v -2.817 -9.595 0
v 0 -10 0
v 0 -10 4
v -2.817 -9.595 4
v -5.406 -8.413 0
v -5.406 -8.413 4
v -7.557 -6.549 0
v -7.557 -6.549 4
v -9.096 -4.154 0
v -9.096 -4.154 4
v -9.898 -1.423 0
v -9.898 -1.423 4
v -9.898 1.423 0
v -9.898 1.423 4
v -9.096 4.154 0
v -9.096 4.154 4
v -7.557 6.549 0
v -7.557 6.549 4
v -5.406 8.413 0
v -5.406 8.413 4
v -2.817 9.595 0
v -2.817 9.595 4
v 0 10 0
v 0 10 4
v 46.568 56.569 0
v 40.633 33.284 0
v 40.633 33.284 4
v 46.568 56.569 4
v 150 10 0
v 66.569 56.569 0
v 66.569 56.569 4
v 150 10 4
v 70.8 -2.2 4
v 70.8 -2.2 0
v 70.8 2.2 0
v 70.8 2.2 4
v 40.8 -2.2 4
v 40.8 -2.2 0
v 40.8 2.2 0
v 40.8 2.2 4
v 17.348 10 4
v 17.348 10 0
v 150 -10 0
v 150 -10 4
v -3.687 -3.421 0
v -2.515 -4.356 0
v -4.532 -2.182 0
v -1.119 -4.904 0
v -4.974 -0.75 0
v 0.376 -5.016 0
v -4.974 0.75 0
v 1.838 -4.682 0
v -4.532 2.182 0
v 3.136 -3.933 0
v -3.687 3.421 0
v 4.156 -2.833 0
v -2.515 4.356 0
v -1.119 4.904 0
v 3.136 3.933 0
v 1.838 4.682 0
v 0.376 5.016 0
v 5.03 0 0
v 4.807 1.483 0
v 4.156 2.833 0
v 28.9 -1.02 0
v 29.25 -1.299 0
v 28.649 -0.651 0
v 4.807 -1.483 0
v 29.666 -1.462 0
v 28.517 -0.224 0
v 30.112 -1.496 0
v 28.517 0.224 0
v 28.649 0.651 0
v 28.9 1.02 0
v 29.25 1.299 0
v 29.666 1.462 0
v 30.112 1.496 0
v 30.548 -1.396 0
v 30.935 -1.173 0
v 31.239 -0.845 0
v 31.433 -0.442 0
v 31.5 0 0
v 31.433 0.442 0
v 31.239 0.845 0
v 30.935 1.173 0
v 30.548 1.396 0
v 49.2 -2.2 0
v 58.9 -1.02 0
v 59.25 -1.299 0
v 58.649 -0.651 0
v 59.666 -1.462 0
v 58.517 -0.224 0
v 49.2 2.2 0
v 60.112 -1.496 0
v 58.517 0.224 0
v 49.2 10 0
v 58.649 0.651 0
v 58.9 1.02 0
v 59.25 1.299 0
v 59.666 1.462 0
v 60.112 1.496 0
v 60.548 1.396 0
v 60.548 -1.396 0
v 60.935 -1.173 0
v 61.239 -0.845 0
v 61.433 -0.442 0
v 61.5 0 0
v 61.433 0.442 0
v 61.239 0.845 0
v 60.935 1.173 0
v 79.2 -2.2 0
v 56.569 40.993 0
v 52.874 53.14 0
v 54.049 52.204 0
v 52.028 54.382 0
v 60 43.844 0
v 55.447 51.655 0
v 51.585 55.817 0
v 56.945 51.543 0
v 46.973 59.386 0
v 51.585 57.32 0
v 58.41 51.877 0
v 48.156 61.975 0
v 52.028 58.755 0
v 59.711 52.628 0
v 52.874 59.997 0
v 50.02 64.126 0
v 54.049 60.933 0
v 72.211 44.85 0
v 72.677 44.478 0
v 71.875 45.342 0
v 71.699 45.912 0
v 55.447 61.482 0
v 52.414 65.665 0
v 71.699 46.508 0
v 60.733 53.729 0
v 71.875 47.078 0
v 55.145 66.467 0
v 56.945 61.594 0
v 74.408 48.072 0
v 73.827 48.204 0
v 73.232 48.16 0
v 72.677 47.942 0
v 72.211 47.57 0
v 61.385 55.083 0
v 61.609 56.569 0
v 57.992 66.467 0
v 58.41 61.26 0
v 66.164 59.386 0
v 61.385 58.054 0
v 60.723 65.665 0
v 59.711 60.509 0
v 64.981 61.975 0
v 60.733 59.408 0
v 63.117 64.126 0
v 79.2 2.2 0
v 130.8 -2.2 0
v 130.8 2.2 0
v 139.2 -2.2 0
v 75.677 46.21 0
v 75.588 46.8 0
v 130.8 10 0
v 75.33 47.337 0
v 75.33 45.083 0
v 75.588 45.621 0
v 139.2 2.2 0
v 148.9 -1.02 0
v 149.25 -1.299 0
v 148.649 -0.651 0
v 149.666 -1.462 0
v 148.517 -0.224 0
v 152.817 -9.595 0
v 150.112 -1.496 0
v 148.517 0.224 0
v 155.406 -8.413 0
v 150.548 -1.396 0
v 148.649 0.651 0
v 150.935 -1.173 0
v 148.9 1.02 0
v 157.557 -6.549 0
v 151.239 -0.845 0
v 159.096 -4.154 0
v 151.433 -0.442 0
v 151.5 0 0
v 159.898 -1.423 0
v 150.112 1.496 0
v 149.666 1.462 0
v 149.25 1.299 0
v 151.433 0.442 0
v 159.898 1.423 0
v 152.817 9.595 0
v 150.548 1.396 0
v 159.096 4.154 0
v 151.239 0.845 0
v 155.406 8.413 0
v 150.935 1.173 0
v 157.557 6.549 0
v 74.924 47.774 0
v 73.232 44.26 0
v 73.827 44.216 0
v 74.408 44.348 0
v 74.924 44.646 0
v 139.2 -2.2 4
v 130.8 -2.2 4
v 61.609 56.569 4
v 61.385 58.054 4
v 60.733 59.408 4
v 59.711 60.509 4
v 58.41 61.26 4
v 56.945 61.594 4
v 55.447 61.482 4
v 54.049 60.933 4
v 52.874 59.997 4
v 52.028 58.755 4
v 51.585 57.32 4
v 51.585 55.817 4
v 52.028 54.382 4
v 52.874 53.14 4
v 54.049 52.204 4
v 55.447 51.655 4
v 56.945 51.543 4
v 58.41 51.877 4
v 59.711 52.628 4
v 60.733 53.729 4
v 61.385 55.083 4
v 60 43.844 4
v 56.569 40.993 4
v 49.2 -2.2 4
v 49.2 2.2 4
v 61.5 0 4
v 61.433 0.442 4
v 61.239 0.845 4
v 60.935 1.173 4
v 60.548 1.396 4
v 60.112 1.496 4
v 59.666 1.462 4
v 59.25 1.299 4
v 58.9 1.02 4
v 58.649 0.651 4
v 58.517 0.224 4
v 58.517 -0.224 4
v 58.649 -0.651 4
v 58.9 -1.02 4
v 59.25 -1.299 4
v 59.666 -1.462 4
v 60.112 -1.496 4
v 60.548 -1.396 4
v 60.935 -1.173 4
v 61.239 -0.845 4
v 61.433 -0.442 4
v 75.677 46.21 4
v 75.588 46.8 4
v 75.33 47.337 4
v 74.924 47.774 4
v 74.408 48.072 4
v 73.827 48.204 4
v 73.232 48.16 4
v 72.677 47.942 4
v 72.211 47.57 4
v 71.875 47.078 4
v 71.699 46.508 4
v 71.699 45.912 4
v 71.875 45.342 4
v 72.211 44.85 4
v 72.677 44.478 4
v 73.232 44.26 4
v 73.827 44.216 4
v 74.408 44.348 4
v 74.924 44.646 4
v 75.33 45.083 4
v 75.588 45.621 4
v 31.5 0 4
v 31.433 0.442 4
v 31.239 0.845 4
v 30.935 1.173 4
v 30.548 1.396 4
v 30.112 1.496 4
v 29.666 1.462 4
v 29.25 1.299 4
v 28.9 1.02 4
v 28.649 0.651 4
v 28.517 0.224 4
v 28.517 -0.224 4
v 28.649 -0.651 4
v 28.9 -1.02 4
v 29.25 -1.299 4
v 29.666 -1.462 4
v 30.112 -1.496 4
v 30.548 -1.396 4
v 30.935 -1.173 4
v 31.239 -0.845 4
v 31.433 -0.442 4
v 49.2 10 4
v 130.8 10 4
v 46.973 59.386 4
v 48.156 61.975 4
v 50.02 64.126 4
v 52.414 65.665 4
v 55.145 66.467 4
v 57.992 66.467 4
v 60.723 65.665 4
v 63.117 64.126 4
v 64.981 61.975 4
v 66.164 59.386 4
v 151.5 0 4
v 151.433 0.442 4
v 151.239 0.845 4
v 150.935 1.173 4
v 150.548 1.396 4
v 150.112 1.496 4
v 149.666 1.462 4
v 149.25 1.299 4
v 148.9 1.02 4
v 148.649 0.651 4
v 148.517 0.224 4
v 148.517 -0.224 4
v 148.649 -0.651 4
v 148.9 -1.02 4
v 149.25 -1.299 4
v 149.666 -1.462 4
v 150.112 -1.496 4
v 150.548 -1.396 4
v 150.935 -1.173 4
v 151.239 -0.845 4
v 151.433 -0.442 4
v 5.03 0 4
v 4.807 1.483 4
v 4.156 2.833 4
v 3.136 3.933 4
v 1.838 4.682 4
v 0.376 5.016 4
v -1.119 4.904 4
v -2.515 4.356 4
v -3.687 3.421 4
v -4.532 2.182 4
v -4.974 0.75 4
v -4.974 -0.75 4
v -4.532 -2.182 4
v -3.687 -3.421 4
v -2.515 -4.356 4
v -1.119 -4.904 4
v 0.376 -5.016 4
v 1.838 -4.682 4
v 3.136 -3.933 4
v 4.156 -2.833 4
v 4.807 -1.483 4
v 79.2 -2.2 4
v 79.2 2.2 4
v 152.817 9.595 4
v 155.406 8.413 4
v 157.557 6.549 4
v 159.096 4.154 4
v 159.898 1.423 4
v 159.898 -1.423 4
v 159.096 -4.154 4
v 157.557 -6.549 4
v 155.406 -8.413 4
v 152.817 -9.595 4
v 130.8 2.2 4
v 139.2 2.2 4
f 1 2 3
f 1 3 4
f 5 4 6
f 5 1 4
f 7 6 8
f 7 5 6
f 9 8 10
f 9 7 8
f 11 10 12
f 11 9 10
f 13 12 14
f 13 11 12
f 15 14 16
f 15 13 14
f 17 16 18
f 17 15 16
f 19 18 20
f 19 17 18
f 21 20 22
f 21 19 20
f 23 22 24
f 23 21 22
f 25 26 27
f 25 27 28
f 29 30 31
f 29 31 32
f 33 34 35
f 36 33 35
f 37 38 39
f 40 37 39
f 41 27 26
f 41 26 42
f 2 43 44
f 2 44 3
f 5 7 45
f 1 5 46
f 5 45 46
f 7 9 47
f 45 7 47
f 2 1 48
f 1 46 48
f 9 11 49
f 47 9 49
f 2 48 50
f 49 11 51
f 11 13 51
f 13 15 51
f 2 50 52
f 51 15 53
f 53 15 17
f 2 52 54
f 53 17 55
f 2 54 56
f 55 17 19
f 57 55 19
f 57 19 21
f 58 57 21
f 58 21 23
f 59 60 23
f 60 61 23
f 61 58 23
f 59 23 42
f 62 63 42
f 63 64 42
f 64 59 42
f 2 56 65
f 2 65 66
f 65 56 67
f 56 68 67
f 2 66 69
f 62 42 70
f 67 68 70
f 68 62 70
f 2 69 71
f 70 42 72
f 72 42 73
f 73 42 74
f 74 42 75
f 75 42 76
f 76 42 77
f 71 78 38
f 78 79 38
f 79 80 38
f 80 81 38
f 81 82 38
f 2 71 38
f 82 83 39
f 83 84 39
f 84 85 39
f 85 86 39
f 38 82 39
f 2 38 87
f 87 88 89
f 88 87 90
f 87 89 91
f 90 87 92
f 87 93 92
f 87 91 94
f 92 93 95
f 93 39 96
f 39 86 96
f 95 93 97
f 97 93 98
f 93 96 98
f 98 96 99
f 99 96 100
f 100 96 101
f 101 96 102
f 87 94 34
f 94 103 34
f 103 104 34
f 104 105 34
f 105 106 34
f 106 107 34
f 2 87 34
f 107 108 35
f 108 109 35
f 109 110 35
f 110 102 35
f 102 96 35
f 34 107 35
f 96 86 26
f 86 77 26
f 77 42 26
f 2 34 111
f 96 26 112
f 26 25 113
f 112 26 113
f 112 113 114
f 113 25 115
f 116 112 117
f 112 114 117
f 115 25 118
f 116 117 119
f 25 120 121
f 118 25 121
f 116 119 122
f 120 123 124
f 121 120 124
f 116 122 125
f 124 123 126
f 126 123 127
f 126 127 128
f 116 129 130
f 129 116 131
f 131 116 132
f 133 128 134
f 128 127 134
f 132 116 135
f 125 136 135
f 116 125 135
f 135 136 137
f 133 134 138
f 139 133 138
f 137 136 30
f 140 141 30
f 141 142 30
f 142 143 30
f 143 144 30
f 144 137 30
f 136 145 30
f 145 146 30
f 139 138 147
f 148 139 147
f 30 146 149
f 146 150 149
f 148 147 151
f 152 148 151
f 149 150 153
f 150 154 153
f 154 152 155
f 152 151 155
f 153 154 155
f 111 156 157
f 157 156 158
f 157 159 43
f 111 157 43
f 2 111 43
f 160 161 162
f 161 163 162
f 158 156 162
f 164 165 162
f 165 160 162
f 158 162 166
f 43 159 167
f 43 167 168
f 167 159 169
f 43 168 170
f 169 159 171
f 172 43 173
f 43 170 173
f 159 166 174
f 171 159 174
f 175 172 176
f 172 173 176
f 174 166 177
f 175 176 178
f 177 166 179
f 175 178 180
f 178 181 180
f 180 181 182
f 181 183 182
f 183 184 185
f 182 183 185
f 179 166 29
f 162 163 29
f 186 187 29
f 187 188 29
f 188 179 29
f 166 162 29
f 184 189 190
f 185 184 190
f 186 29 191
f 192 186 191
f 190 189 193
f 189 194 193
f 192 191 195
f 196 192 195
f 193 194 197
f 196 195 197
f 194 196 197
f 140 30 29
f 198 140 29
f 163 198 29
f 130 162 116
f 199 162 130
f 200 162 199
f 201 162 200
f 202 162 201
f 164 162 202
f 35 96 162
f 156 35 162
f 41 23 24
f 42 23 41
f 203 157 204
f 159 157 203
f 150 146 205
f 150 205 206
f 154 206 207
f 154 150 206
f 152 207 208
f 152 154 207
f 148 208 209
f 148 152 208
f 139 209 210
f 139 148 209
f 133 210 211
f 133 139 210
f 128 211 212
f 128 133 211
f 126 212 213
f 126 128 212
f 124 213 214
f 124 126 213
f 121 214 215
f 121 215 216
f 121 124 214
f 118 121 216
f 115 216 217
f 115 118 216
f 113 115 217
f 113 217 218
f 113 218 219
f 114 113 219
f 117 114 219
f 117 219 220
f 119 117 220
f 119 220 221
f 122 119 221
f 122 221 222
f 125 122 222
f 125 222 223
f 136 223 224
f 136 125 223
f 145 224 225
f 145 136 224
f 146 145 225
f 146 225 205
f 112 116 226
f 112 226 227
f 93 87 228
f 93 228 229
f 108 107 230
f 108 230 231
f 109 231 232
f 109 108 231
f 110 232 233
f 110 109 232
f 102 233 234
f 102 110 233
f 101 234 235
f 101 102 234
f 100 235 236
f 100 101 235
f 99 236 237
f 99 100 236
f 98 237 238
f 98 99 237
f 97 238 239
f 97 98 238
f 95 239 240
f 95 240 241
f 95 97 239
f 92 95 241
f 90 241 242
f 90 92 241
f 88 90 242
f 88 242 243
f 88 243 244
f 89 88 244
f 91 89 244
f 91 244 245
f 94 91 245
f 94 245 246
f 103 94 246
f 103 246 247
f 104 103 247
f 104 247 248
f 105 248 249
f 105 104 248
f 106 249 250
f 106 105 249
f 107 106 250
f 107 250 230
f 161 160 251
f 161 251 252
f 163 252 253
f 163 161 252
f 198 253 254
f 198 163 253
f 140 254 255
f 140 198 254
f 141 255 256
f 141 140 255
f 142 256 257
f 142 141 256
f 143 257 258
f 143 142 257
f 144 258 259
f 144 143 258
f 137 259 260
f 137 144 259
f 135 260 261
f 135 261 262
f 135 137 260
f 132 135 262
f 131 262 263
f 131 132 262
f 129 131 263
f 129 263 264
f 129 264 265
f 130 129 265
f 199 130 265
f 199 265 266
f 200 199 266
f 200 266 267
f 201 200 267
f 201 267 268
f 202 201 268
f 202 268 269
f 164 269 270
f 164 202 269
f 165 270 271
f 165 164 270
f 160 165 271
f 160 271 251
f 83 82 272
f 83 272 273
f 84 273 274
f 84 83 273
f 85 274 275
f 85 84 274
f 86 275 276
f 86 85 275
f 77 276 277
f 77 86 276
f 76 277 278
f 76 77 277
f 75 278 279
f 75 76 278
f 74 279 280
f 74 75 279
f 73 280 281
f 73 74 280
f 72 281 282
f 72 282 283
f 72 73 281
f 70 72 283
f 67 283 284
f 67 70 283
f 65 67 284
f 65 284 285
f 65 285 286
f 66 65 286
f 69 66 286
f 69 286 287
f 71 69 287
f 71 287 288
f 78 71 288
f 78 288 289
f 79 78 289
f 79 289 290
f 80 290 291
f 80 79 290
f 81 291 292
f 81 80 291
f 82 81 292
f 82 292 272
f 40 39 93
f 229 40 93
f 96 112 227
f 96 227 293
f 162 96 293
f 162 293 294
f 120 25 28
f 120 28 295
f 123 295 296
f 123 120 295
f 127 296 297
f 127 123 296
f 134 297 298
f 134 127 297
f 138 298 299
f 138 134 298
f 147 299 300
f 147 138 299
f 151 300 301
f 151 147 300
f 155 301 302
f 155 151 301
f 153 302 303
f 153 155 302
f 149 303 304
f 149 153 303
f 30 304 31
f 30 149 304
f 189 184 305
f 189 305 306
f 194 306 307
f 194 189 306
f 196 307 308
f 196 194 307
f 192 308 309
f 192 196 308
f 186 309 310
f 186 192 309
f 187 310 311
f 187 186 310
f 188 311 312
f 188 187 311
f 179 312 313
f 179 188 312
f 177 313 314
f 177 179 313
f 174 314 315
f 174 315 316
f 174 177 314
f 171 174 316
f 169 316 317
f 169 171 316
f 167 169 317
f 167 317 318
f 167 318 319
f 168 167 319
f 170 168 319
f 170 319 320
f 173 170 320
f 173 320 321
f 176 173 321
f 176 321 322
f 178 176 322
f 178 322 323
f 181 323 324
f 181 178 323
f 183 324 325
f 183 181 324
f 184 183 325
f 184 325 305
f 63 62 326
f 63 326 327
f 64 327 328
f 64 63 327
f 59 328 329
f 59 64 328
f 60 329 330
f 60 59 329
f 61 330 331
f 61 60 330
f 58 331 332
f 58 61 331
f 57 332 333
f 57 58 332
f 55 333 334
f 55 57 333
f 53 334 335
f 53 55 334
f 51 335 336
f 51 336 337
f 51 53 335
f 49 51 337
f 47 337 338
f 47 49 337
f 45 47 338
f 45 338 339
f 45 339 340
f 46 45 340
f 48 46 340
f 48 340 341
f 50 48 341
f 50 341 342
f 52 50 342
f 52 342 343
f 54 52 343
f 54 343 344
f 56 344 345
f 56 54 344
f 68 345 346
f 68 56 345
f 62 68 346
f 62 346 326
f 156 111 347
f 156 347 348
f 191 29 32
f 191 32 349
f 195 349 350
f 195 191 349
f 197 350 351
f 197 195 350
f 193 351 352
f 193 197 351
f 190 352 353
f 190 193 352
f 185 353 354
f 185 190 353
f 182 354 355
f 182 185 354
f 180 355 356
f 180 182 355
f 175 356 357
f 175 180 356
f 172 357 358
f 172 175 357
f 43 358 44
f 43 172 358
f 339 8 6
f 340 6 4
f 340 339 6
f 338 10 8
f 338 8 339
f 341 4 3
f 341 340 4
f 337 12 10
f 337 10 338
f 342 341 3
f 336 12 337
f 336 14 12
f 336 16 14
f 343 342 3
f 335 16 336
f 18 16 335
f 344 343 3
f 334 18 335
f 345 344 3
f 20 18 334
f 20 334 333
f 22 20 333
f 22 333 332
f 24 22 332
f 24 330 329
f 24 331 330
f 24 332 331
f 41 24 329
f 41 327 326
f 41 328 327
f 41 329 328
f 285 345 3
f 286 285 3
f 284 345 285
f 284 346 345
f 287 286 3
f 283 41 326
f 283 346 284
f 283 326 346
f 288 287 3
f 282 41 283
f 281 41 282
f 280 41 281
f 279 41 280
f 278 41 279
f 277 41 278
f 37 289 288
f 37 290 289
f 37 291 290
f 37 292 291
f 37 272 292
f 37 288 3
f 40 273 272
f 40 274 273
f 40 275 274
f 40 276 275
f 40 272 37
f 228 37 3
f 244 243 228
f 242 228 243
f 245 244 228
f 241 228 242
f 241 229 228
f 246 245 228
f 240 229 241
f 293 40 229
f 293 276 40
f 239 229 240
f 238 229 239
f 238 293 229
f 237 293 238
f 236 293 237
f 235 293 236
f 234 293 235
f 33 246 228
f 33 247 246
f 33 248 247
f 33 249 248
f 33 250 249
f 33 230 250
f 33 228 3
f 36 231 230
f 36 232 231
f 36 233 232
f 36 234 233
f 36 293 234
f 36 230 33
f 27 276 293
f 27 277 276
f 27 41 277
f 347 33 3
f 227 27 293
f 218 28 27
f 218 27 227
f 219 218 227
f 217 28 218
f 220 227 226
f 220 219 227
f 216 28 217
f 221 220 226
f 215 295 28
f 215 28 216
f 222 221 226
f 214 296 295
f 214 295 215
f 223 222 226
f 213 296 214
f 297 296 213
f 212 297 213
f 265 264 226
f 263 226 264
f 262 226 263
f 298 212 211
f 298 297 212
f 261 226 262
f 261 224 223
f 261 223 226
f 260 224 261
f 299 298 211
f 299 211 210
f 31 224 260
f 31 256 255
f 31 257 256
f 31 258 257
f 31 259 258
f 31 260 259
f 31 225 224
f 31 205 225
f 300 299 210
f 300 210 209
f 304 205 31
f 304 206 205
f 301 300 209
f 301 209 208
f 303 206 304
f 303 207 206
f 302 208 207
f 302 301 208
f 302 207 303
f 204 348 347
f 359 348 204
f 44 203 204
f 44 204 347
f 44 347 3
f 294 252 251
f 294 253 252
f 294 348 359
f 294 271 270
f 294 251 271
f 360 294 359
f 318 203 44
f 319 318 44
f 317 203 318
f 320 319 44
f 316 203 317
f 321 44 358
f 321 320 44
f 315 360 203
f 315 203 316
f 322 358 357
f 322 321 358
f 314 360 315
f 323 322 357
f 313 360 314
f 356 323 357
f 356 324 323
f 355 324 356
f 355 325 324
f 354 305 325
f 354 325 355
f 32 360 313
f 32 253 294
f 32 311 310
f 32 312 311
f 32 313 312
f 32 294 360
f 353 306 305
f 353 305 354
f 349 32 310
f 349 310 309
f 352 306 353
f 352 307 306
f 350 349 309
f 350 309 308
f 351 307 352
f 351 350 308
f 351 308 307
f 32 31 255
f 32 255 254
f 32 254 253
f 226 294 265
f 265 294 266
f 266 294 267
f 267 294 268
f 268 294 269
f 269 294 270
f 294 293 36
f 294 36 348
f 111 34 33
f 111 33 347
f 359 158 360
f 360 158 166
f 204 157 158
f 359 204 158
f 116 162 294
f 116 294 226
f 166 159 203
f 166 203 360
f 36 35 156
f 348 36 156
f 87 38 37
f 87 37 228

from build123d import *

# Parameters (mm, degrees)
SKETCH_1_R      = 5.03
SKETCH_1_R_2    = 5.04
SKETCH_1_R_3    = 1.5
SKETCH_1_R_4    = 2
SKETCH_1_W      = 8.4
SKETCH_1_H      = 4.4
EXTRUDE_1_DEPTH = 4
EXTRUDE_2_DEPTH = 4


with BuildPart() as part:
    # 草图1 → 凸台-拉伸1 (new body)
    with BuildSketch(Plane.XY):
        with BuildLine():
            Line((0, 10), (34.696699141, 10))
            Line((34.696699141, 10), (46.568305139, 56.568542495))
            ThreePointArc((46.568305139, 56.568542495), (56.568542495, 66.568779851), (66.568779851, 56.568542495))
            Line((66.568779851, 56.568542495), (150, 10))
            ThreePointArc((150, 10), (160, 0), (150, -10))
            Line((150, -10), (0, -10))
            ThreePointArc((0, -10), (-10, 0), (0, 10))
        make_face()
        Circle(SKETCH_1_R, mode=Mode.SUBTRACT)
        with Locations((56.568542495, 56.568542495)):
            Circle(SKETCH_1_R_2, mode=Mode.SUBTRACT)
        with Locations((30, 0)):
            Circle(SKETCH_1_R_3, mode=Mode.SUBTRACT)
        with Locations((60, 0)):
            Circle(SKETCH_1_R_3, mode=Mode.SUBTRACT)
        with Locations((150, 0)):
            Circle(SKETCH_1_R_3, mode=Mode.SUBTRACT)
        with Locations((73.677090033, 46.210086957)):
            Circle(SKETCH_1_R_4, mode=Mode.SUBTRACT)
        with Locations((75, 0)):
            Rectangle(SKETCH_1_W, SKETCH_1_H, mode=Mode.SUBTRACT)
        with Locations((45, 0)):
            Rectangle(SKETCH_1_W, SKETCH_1_H, mode=Mode.SUBTRACT)
        with Locations((135, 0)):
            Rectangle(SKETCH_1_W, SKETCH_1_H, mode=Mode.SUBTRACT)
        Polygon((56.568542495, 40.992584384), (49.2, 10), (130.8, 10), (60, 43.844151412), align=None, mode=Mode.SUBTRACT)
    extrude(amount=EXTRUDE_1_DEPTH)

    # 草图2 → 凸台-拉伸2 (add)
    with BuildSketch(Plane.XY.offset(4)):
        Polygon((34.696699141, 10), (40.63250214, 33.284271247), (17.348349571, 10), align=None)
    extrude(amount=-EXTRUDE_2_DEPTH)


solid = part.part
